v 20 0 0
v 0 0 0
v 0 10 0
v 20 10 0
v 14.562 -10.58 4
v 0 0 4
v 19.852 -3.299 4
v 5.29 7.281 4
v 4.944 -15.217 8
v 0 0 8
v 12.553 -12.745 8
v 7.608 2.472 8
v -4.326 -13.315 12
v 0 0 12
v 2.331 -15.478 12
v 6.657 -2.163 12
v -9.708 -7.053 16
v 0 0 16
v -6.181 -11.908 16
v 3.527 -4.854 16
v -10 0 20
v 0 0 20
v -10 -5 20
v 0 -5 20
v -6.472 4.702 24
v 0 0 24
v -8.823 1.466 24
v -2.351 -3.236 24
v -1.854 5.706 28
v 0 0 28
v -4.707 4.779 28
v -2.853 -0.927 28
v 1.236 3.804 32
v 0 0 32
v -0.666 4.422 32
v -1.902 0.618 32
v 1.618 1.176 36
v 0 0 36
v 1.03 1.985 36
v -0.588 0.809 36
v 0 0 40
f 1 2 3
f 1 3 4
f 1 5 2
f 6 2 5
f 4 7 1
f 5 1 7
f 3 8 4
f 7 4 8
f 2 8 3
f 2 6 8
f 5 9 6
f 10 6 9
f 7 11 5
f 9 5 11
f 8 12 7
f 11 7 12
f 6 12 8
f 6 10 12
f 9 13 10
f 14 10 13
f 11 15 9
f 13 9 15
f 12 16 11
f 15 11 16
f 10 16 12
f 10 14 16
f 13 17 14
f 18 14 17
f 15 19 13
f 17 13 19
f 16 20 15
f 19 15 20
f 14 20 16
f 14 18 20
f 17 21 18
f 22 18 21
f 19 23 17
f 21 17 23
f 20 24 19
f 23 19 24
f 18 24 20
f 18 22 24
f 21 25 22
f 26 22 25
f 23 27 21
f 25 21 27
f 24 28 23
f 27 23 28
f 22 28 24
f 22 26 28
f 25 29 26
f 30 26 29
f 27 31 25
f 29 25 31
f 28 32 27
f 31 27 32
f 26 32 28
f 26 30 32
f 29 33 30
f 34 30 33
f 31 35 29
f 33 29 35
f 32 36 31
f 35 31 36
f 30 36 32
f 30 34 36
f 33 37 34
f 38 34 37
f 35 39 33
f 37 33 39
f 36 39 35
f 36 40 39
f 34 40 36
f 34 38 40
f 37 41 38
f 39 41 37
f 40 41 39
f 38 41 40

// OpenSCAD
//Abstact Art Maker

Height = 40;

Twist = 360;

Scale = 0;

Slices = 10;

//Base Width
Width = 20;

//Base Length
Length = 10;

linear_extrude(height = Height, twist = Twist, scale = Scale,  slices = Slices)
            square([Width, Length]);
